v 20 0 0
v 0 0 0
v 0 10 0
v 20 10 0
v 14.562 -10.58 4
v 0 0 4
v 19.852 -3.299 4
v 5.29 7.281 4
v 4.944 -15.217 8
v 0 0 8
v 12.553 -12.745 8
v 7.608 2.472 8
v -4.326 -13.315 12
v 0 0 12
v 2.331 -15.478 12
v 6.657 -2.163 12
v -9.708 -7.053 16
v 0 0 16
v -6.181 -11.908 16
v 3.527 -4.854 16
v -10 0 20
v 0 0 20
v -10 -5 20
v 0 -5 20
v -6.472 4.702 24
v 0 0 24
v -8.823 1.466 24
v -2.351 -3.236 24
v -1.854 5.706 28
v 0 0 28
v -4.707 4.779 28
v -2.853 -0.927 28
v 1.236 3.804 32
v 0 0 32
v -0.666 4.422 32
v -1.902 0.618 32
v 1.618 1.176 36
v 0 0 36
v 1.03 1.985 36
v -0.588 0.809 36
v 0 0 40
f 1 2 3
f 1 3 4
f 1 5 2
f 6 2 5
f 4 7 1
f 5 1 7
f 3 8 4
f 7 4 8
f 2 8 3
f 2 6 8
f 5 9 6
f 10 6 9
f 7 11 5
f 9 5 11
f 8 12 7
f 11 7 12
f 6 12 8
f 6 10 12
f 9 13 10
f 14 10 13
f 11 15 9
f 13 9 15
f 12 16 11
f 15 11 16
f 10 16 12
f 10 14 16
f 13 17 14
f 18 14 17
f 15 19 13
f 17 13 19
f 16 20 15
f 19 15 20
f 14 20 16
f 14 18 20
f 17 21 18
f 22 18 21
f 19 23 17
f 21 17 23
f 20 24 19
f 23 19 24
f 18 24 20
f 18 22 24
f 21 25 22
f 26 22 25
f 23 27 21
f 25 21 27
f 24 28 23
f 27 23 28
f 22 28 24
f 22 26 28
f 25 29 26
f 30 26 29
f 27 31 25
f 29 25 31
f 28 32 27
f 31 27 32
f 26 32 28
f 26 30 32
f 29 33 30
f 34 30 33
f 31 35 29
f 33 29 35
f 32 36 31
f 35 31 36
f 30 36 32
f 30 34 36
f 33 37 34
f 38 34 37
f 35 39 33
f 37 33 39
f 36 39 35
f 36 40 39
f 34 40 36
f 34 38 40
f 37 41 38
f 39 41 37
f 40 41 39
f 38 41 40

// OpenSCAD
//Abstact Art Maker

Height = 40;

Twist = 360;

Scale = 0;

Slices = 10;

//Base Width
Width = 20;

//Base Length
Length = 10;

linear_extrude(height = Height, twist = Twist, scale = Scale,  slices = Slices)
            square([Width, Length]);
